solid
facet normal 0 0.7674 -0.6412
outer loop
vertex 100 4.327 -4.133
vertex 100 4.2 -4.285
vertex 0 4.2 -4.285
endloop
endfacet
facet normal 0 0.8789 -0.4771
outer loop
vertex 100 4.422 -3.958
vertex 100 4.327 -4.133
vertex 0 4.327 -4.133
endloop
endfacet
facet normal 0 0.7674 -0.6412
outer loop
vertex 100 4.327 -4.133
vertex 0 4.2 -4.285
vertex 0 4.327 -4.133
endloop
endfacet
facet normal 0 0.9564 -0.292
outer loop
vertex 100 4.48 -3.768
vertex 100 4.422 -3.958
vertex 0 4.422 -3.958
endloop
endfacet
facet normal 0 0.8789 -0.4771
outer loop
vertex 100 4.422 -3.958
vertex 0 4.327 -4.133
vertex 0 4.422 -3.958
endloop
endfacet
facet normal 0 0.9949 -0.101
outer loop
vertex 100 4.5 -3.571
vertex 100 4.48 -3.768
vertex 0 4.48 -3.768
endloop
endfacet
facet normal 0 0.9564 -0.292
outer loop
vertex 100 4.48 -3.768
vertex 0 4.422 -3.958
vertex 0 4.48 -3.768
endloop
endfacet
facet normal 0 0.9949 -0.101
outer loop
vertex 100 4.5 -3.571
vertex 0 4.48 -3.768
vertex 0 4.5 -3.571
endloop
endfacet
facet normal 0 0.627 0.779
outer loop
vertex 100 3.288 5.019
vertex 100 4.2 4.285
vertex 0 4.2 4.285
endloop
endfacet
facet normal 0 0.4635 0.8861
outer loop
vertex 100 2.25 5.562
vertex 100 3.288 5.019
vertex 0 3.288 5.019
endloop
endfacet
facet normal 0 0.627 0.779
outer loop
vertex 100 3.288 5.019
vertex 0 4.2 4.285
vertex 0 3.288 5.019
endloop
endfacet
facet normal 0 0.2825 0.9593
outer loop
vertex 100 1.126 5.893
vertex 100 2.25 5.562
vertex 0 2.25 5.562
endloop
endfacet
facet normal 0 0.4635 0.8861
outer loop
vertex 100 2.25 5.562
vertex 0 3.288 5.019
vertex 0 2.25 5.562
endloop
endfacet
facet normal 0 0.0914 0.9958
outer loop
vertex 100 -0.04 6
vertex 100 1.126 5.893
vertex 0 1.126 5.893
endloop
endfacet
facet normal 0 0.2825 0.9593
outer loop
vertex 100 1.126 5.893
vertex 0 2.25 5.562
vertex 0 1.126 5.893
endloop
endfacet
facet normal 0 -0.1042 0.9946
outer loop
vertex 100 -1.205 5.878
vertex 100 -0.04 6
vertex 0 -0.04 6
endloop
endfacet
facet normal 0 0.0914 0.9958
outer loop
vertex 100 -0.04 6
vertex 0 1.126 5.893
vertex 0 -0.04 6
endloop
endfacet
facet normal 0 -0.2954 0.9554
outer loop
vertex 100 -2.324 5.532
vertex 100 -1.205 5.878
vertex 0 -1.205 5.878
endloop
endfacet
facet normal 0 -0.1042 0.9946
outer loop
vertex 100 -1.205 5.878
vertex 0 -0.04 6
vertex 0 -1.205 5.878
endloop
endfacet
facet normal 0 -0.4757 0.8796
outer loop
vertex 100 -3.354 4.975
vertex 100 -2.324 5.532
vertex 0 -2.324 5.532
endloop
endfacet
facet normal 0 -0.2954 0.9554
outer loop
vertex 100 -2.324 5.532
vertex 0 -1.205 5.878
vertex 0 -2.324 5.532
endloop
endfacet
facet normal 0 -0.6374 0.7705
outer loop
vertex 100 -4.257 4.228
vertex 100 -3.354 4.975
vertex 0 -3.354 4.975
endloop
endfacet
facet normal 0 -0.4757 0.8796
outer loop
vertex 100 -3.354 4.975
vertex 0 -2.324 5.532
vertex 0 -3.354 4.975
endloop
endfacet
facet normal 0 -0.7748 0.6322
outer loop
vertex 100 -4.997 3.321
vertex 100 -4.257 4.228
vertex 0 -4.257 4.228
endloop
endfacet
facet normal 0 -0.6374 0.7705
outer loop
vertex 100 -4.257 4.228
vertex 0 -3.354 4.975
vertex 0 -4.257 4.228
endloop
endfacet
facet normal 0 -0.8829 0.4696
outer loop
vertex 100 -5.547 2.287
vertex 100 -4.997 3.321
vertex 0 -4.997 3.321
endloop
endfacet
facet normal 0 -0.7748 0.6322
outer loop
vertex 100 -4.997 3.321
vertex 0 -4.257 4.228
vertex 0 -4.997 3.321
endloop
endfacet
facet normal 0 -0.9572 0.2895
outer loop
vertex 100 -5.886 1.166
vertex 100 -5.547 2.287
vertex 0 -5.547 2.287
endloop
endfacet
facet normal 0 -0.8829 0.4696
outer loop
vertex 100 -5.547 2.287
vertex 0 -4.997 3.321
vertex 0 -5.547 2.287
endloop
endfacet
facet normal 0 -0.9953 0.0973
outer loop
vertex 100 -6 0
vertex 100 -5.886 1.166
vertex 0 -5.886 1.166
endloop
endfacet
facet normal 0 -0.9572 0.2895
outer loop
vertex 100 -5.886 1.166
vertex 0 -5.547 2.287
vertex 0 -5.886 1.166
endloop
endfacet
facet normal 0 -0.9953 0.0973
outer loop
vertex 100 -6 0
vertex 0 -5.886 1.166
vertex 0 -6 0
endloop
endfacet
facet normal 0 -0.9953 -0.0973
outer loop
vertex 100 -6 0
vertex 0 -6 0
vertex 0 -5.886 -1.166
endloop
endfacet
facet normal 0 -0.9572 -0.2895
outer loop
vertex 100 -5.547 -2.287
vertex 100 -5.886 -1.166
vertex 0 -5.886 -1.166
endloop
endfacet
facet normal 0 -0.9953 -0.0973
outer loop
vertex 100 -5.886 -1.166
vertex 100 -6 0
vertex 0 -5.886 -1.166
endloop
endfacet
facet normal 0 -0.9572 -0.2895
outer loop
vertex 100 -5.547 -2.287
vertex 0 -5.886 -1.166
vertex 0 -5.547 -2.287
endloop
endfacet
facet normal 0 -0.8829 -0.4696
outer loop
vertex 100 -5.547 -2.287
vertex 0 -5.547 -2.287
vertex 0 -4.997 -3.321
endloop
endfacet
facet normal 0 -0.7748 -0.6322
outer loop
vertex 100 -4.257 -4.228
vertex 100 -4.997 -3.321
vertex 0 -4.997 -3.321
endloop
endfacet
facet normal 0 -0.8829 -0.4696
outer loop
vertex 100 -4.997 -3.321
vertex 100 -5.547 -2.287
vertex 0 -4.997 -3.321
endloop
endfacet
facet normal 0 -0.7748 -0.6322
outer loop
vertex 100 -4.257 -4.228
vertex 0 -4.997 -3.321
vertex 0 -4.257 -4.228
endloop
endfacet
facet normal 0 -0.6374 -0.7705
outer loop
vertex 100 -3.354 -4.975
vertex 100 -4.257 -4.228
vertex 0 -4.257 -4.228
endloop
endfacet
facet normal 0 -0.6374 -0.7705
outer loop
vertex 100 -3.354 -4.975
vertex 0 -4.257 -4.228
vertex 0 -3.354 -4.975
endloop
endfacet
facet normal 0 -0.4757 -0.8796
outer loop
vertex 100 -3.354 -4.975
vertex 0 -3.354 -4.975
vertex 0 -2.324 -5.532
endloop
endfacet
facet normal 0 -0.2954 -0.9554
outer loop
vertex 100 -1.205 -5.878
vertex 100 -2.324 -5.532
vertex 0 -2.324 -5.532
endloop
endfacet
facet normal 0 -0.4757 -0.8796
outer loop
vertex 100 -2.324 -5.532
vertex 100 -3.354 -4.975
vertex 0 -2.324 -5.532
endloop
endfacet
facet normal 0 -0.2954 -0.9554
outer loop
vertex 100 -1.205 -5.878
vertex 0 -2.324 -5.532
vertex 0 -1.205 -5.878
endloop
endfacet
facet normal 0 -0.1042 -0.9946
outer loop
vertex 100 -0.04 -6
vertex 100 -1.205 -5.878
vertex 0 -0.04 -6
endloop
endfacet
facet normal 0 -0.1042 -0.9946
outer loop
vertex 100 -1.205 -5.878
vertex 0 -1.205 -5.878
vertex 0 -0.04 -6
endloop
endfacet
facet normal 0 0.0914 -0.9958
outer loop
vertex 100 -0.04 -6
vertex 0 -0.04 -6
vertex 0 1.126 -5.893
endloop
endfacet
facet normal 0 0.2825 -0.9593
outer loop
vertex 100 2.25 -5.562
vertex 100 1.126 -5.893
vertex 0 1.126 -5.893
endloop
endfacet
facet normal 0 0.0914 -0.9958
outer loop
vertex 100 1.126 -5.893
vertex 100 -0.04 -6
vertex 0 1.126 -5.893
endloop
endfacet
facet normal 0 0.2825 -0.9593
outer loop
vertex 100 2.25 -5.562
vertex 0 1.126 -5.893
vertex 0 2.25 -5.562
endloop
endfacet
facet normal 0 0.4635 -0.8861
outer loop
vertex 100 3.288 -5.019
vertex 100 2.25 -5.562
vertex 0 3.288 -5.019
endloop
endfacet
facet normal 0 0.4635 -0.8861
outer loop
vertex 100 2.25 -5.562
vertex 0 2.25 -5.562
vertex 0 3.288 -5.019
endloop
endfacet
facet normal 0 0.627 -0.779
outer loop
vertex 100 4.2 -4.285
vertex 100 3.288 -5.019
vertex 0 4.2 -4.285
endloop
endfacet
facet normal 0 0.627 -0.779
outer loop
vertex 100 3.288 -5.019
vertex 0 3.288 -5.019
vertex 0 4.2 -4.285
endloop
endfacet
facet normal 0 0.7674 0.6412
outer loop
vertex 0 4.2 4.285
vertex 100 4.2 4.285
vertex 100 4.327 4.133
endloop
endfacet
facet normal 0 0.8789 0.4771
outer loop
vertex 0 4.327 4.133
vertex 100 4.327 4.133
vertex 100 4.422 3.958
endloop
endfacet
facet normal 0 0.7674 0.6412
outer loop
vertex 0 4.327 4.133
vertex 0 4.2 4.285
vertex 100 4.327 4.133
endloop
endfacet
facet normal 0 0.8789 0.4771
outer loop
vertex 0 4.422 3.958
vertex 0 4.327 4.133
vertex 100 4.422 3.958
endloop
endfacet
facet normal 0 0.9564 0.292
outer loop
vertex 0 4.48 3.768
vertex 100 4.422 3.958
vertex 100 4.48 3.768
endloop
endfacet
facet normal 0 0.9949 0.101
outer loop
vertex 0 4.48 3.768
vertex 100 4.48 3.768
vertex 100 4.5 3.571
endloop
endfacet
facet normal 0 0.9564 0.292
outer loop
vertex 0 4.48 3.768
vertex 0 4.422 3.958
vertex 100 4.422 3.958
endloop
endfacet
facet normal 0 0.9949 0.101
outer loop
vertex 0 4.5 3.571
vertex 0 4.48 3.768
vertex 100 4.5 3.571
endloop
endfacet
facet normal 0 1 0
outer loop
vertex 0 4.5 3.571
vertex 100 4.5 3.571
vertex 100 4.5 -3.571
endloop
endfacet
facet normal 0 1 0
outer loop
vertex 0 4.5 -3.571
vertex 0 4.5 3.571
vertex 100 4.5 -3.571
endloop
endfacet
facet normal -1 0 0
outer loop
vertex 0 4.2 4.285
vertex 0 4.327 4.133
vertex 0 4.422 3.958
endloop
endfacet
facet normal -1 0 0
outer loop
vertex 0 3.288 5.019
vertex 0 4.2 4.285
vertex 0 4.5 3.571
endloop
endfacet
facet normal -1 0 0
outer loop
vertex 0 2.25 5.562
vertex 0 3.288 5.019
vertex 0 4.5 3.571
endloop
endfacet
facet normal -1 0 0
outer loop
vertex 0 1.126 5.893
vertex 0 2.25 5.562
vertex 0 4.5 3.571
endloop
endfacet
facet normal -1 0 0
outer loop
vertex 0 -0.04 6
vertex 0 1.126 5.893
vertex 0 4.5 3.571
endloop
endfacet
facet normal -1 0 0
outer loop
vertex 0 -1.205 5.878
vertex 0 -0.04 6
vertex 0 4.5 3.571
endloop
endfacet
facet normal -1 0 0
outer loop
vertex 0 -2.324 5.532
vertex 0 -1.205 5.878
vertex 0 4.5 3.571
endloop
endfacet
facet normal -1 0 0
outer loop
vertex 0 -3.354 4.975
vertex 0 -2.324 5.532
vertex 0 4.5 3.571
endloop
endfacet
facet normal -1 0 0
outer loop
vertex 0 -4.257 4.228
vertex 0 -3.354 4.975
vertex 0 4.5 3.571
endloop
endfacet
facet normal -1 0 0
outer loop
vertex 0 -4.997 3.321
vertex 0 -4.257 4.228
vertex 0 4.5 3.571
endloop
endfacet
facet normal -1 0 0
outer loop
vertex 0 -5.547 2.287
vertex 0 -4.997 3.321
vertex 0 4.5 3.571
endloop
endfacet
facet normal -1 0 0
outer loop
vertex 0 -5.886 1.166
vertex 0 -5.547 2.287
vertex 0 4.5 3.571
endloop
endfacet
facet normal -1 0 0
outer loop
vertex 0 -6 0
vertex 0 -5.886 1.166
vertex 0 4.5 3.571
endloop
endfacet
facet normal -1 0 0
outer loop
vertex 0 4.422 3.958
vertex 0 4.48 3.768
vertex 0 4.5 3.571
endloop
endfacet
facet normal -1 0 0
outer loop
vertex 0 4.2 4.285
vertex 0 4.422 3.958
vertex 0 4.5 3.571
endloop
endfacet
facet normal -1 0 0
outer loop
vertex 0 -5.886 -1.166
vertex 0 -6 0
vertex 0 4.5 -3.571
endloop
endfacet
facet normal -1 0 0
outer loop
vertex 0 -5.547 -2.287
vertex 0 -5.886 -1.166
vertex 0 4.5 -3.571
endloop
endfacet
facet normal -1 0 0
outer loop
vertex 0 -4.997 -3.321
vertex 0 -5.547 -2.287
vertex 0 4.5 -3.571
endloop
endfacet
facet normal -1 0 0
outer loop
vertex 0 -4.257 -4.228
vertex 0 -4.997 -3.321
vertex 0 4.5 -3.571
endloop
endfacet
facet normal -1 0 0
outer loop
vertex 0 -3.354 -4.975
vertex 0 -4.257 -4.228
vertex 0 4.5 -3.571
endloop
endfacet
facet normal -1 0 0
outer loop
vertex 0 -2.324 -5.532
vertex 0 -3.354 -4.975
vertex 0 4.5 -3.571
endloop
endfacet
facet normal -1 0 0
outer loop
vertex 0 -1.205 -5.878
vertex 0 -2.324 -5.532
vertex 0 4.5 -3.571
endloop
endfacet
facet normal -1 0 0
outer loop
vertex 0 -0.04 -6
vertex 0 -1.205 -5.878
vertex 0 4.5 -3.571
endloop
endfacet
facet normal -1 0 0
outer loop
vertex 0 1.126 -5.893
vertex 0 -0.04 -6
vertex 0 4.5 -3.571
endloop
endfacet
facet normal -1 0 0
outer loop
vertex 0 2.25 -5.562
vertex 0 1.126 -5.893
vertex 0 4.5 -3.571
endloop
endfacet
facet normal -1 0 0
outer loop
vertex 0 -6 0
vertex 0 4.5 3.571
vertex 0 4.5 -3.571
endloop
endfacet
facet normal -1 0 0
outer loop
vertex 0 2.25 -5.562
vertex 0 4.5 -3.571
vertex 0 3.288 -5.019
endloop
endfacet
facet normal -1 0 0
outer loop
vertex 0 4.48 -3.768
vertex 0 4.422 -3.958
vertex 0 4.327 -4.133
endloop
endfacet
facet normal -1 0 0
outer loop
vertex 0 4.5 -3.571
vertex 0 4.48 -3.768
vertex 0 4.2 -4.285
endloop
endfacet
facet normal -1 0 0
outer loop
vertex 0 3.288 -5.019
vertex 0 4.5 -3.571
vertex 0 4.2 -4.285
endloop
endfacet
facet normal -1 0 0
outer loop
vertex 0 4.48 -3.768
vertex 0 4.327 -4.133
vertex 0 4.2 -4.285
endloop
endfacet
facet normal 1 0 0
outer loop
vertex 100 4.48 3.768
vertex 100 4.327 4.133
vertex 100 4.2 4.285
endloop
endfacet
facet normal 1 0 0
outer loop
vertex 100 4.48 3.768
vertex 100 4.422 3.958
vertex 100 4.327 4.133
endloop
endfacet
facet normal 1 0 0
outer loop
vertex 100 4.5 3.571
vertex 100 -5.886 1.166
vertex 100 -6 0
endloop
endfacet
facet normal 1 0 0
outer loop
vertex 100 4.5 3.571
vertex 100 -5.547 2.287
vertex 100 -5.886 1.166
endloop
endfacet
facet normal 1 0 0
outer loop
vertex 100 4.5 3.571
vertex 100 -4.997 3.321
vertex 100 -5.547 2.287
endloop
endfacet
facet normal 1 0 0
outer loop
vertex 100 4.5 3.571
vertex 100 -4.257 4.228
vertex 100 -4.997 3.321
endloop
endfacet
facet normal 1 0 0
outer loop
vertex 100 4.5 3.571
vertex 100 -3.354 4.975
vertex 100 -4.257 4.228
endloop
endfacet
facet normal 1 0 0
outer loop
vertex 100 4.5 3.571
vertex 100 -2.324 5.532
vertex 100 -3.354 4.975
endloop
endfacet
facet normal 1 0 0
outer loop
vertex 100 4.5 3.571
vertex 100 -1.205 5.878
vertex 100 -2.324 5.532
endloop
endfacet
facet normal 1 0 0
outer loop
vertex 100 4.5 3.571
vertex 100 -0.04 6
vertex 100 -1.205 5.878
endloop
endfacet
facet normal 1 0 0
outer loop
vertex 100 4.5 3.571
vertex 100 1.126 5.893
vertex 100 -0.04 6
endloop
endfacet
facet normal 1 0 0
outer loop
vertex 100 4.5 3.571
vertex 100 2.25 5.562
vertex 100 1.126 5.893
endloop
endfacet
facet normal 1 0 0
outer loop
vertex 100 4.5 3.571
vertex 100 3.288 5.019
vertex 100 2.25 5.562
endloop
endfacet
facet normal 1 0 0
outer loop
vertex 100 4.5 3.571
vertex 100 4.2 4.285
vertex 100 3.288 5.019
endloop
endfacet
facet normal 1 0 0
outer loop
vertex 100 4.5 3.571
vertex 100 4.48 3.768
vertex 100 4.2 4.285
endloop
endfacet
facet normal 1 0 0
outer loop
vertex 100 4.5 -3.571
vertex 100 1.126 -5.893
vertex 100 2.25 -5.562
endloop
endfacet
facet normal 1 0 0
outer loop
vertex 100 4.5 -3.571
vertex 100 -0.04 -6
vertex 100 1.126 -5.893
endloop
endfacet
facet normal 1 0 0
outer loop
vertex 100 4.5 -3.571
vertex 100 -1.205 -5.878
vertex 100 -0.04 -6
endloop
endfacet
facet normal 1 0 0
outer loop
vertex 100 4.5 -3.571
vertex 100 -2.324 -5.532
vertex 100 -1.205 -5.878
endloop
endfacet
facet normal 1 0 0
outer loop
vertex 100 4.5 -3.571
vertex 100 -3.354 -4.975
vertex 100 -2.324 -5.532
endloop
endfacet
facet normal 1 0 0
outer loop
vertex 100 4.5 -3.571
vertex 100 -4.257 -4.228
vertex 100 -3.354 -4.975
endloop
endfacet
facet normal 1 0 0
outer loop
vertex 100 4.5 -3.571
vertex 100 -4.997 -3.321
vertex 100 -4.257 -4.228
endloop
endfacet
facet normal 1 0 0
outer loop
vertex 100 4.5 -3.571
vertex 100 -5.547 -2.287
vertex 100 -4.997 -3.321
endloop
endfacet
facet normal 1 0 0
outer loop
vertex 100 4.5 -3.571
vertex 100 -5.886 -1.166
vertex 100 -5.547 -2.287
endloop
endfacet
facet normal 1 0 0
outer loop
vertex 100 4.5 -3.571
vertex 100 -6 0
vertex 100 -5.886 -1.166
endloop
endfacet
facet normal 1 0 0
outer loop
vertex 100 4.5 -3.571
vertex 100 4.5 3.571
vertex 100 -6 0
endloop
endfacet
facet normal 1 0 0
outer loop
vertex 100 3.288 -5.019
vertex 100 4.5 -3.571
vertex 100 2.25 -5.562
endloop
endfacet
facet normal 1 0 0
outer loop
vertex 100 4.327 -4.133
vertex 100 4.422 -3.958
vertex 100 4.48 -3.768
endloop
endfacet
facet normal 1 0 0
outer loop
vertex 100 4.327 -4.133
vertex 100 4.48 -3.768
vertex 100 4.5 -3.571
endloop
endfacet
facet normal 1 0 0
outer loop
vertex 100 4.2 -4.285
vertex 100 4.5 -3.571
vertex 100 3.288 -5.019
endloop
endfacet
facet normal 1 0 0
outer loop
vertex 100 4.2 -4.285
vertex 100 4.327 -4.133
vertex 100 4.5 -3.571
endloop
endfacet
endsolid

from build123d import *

# Parameters (mm, degrees)
SKETCH1_R           = 6
BOSS_EXTRUDE1_DEPTH = 100
CUT_EXTRUDE1_DEPTH  = 101
FILLET1_R           = 1


with BuildPart() as part:
    # Sketch1 → Boss-Extrude1 (new body)
    with BuildSketch(Plane(origin=(0, 0, 0), x_dir=(0, 0, -1), z_dir=(1, 0, 0))):
        Circle(SKETCH1_R)
    extrude(amount=BOSS_EXTRUDE1_DEPTH)

    # Sketch2 → Cut-Extrude1 (cut, through all)
    with BuildSketch(Plane(origin=(100, 0, 0), x_dir=(0, 0, -1), z_dir=(1, 0, 0))):
        Polygon((45.463107393, 6.099427515), (3.968626967, 6.099427515), (-3.968626967, 6.099427515), (-3.968626967, 4.5), (3.968626967, 4.5), (3.968626967, 6.19024408), (3.968626967, 47.684724507), (-54.777541729, -10.933150643), (-13.283061303, -52.518447634), align=None)
    extrude(amount=-CUT_EXTRUDE1_DEPTH, mode=Mode.SUBTRACT)

    # Fillet1
    fillet1_edges = [part.edges().sort_by_distance(p)[0] for p in [
        (50, 4.5, 3.968626967),
        (50, 4.5, -3.968626967),
    ]]
    fillet(fillet1_edges, radius=FILLET1_R)


solid = part.part
